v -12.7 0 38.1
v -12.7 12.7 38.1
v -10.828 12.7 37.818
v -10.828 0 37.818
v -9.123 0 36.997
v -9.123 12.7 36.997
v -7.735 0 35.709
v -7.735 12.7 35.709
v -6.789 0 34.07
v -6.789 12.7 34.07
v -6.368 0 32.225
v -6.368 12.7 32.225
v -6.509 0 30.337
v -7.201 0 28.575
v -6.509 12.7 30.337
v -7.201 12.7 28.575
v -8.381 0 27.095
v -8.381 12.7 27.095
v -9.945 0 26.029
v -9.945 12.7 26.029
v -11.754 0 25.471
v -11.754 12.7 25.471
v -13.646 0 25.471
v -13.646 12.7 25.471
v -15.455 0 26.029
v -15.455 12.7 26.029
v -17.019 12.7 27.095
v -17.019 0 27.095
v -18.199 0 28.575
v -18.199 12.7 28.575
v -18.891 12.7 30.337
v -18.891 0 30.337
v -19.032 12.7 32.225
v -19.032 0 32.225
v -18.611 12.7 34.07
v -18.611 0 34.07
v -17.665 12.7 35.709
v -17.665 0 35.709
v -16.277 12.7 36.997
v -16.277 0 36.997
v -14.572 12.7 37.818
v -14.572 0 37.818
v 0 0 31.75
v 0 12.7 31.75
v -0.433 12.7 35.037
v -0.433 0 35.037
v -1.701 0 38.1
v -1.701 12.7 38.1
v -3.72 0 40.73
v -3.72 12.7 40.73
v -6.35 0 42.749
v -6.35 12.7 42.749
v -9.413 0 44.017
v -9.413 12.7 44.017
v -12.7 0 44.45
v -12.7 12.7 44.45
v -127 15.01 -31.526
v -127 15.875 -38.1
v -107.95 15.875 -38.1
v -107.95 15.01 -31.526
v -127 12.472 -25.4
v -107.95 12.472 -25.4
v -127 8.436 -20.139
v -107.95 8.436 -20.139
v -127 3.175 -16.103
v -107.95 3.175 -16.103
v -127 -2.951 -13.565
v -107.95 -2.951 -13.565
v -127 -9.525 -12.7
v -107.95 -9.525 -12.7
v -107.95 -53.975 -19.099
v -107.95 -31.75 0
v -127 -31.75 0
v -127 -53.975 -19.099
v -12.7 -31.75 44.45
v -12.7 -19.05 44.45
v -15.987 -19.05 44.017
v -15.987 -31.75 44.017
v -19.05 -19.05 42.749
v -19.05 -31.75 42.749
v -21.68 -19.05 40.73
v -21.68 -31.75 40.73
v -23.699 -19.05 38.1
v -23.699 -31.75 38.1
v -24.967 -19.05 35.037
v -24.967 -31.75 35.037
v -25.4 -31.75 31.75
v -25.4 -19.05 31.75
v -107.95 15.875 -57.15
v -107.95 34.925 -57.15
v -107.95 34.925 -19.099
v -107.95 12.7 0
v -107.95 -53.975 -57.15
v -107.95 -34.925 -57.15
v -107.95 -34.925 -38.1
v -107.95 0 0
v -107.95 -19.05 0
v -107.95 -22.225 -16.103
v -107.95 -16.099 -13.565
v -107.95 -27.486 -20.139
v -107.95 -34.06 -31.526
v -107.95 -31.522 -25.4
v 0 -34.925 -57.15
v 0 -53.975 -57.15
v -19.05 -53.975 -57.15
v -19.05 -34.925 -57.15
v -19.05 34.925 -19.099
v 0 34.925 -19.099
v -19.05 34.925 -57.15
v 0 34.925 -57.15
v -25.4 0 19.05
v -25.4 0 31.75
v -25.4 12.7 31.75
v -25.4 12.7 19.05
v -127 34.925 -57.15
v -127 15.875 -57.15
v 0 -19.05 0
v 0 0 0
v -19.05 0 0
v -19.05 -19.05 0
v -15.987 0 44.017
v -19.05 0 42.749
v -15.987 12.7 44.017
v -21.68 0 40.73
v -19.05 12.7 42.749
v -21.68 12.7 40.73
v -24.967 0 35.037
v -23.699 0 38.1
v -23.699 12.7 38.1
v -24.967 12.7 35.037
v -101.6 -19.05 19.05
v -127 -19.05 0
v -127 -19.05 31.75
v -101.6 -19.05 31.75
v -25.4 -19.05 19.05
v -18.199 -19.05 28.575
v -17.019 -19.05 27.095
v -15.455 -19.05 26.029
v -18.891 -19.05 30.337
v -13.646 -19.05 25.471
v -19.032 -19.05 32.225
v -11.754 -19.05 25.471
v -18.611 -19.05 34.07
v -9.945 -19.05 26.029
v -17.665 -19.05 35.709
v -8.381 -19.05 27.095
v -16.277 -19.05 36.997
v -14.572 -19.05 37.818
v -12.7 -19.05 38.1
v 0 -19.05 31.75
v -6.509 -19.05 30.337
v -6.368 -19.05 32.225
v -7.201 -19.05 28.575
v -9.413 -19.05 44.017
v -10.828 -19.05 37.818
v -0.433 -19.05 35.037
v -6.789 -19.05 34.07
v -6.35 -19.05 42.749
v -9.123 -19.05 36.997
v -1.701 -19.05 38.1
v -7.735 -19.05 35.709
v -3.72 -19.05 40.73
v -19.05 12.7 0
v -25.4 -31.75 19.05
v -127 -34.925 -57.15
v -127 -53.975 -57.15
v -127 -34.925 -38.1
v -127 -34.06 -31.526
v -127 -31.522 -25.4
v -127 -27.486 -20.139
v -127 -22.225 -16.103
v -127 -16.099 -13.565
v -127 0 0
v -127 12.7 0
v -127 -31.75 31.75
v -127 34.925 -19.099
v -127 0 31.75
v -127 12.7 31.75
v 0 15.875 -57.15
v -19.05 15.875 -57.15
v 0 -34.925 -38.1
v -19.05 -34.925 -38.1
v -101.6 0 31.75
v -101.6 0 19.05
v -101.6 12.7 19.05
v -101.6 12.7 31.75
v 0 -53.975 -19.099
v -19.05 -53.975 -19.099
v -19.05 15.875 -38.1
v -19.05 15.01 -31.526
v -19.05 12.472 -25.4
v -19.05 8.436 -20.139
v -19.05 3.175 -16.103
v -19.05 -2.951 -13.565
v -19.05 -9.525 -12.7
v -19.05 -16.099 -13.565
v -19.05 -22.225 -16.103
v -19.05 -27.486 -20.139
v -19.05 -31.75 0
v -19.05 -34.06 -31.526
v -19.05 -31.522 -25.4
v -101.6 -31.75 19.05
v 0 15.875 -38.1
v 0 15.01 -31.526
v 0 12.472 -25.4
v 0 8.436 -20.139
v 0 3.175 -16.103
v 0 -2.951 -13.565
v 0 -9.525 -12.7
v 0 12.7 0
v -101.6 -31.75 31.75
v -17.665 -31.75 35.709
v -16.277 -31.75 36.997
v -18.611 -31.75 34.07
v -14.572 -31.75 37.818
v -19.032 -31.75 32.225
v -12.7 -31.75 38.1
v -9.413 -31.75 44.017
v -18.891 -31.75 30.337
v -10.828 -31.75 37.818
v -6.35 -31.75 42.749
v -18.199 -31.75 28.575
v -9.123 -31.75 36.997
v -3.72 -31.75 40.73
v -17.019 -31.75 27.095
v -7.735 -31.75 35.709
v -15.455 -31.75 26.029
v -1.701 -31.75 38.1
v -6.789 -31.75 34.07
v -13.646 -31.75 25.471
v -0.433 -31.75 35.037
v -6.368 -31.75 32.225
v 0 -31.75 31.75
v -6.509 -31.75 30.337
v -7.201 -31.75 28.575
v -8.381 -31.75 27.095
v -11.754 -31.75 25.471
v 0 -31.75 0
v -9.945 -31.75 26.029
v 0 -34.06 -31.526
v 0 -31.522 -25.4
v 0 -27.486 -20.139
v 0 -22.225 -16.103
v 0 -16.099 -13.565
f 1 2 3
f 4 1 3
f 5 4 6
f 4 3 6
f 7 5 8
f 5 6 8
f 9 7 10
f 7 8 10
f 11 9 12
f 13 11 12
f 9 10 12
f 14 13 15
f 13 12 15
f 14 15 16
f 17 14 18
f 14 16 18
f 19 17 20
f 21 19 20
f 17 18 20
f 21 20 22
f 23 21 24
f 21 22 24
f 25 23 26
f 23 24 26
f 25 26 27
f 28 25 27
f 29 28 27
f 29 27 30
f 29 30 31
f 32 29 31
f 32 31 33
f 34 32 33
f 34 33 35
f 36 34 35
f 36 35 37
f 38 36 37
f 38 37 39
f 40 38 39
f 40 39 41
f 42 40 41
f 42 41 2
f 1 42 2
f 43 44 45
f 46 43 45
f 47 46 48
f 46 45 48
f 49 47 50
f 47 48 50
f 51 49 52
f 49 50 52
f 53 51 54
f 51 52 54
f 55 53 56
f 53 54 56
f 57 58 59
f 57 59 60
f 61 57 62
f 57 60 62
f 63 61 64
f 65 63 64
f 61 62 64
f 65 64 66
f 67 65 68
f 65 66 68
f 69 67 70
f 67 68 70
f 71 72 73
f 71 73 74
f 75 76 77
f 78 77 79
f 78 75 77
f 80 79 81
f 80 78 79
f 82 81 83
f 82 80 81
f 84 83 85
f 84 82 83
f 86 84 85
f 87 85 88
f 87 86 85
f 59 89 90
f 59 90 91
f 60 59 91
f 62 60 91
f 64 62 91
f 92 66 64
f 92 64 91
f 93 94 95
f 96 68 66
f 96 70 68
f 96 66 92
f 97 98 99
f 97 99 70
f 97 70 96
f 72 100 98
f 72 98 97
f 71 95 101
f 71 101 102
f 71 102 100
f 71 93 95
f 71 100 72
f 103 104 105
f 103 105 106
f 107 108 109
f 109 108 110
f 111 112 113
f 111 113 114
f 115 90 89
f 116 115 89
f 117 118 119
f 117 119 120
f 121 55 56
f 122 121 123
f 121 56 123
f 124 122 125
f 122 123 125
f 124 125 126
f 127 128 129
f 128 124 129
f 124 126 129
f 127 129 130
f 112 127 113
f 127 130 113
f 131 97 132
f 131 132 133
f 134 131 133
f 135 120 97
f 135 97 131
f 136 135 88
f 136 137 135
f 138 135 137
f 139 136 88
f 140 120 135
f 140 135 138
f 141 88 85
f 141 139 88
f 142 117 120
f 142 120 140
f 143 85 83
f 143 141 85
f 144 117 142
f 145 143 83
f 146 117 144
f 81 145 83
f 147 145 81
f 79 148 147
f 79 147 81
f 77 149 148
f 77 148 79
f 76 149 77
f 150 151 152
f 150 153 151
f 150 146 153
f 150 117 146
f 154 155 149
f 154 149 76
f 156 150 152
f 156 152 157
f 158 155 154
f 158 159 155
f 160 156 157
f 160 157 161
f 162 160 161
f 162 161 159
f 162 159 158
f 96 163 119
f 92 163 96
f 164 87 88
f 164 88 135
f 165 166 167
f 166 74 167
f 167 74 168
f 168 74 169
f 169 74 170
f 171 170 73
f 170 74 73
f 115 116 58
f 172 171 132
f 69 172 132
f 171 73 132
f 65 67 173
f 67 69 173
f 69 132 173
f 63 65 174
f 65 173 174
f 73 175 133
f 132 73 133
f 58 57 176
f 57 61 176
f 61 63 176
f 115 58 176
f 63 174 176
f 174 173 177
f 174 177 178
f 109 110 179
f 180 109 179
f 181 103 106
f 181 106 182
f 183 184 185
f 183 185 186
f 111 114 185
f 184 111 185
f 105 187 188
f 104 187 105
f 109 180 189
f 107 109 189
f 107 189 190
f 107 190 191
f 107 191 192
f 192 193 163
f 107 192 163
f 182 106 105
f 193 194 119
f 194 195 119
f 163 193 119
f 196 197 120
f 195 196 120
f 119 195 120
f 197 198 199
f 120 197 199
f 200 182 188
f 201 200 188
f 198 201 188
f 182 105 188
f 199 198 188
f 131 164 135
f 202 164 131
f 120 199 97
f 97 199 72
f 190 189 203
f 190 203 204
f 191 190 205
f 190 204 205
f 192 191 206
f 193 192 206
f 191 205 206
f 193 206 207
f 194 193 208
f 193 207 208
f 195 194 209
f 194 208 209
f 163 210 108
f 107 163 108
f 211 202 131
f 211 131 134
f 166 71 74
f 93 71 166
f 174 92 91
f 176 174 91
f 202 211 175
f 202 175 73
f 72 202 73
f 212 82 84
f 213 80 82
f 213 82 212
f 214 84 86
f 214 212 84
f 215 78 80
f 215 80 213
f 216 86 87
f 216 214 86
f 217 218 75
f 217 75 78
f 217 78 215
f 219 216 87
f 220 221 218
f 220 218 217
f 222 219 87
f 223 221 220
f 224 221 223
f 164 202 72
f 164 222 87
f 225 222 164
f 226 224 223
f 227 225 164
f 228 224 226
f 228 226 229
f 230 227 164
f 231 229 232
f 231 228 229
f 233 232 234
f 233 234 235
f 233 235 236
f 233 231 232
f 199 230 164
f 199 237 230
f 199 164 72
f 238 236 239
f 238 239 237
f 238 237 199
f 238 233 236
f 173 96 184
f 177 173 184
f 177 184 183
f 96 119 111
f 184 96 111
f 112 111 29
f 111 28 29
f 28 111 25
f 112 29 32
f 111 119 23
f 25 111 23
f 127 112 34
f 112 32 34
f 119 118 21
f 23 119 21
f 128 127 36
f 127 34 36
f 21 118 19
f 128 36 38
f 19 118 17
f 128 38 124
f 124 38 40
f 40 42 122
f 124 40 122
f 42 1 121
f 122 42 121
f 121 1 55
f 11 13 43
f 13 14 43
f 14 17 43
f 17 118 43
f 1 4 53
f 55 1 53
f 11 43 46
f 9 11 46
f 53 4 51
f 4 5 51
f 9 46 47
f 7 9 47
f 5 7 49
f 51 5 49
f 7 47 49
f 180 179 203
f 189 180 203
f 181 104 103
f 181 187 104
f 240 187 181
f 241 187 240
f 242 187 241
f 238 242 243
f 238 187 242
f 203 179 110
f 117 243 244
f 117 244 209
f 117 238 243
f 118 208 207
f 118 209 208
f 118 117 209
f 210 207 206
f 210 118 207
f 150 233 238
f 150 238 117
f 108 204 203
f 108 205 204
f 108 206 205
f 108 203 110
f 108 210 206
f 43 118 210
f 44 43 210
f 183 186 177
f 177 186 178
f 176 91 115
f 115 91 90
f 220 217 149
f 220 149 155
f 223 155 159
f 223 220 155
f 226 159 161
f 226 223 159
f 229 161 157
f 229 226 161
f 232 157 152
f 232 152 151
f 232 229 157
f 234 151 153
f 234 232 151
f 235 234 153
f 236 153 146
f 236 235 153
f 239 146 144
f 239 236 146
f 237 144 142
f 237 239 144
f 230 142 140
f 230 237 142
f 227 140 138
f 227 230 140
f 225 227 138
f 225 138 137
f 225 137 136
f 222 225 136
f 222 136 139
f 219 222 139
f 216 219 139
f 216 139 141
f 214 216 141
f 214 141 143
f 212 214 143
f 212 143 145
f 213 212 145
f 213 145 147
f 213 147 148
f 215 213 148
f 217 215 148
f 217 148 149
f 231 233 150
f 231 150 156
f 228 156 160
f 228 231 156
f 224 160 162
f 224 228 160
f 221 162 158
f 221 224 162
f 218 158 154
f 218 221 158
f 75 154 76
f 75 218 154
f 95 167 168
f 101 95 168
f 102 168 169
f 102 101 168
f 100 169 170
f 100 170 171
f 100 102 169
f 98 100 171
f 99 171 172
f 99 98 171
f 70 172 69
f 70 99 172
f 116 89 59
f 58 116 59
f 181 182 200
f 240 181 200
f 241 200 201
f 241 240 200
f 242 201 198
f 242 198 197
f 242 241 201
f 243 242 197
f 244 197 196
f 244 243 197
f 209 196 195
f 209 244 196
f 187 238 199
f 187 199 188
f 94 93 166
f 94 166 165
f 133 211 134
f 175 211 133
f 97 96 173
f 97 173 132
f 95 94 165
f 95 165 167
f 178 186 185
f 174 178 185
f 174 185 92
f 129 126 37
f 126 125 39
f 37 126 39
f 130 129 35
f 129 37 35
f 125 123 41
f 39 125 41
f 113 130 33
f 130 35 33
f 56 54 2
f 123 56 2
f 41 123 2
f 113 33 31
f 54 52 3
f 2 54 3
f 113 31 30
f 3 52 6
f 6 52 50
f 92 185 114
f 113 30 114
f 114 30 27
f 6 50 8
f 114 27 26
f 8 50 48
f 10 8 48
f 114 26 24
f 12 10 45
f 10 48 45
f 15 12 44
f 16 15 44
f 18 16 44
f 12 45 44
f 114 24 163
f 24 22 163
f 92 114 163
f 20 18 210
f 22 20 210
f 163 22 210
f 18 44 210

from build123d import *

# Parameters (mm, degrees)
SKETCH1_W           = 12.7
SKETCH1_H           = 44.45
BOSS_EXTRUDE1_DEPTH = 127
SKETCH2_R           = 6.35
CUT_EXTRUDE1_DEPTH  = 142.028625197
SKETCH4_W           = 88.9
SKETCH4_H           = 57.15
CUT_EXTRUDE2_DEPTH  = 147.187978302


with BuildPart() as part:
    # Sketch1 → Boss-Extrude1 (new body)
    with BuildSketch(Plane.YZ):
        with BuildLine():
            ThreePointArc((15.875, -38.1), (8.435512242, -20.139487758), (-9.525, -12.7))
            Line((-9.525, -12.7), (-9.525, 0))
            Line((-9.525, 0), (0, 0))
            Line((0, 0), (0, 44.45))
            Line((0, 44.45), (12.7, 44.45))
            Line((12.7, 44.45), (12.7, 0))
            Line((12.7, 0), (34.925, -19.098767483))
            Line((34.925, -19.098767483), (34.925, -57.15))
            Line((34.925, -57.15), (15.875, -57.15))
            Line((15.875, -57.15), (15.875, -38.1))
        make_face()
        with Locations((6.35, 22.225)):
            Rectangle(SKETCH1_W, SKETCH1_H)
    extrude(amount=-BOSS_EXTRUDE1_DEPTH)

    # Sketch2 → Cut-Extrude1 (cut, through all)
    with BuildSketch(Plane(origin=(0, 12.7, 0), x_dir=(-1, 0, 0), z_dir=(0, 1, 0))):
        with BuildLine():
            Line((101.6, 31.75), (127, 31.75))
            Line((127, 31.75), (127, 44.45))
            Line((127, 44.45), (12.700000053, 44.45))
            ThreePointArc((12.700000053, 44.45), (21.68025614, 40.730256102), (25.4, 31.75))
            Line((25.4, 31.75), (25.4, 19.05))
            Line((25.4, 19.05), (101.6, 19.05))
            Line((101.6, 19.05), (101.6, 31.75))
        make_face()
        with BuildLine():
            ThreePointArc((0, 31.75), (3.719743898, 40.73025614), (12.700000053, 44.45))
            Line((12.700000053, 44.45), (0, 44.45))
            Line((0, 44.45), (0, 31.75))
        make_face()
        with Locations(Location((12.7, 31.75, 0), (0, 0, 90))):
            Circle(SKETCH2_R)
    extrude(amount=-CUT_EXTRUDE1_DEPTH, mode=Mode.SUBTRACT)

    # Sketch4 → Cut-Extrude2 (cut, through all)
    with BuildSketch(Plane(origin=(0, 34.925, 0), x_dir=(-1, 0, 0), z_dir=(0, 1, 0))):
        with Locations((63.5, -28.575)):
            Rectangle(SKETCH4_W, SKETCH4_H)
    extrude(amount=-CUT_EXTRUDE2_DEPTH, mode=Mode.SUBTRACT)

    # Mirror1: part across plane


with BuildPart() as part_1:
    add(part.part)
    add(part.part.mirror(Plane(origin=(-127, -9.525, 0), x_dir=(0, 0, 1), z_dir=(0, -1, 0))))


solid = part_1.part
